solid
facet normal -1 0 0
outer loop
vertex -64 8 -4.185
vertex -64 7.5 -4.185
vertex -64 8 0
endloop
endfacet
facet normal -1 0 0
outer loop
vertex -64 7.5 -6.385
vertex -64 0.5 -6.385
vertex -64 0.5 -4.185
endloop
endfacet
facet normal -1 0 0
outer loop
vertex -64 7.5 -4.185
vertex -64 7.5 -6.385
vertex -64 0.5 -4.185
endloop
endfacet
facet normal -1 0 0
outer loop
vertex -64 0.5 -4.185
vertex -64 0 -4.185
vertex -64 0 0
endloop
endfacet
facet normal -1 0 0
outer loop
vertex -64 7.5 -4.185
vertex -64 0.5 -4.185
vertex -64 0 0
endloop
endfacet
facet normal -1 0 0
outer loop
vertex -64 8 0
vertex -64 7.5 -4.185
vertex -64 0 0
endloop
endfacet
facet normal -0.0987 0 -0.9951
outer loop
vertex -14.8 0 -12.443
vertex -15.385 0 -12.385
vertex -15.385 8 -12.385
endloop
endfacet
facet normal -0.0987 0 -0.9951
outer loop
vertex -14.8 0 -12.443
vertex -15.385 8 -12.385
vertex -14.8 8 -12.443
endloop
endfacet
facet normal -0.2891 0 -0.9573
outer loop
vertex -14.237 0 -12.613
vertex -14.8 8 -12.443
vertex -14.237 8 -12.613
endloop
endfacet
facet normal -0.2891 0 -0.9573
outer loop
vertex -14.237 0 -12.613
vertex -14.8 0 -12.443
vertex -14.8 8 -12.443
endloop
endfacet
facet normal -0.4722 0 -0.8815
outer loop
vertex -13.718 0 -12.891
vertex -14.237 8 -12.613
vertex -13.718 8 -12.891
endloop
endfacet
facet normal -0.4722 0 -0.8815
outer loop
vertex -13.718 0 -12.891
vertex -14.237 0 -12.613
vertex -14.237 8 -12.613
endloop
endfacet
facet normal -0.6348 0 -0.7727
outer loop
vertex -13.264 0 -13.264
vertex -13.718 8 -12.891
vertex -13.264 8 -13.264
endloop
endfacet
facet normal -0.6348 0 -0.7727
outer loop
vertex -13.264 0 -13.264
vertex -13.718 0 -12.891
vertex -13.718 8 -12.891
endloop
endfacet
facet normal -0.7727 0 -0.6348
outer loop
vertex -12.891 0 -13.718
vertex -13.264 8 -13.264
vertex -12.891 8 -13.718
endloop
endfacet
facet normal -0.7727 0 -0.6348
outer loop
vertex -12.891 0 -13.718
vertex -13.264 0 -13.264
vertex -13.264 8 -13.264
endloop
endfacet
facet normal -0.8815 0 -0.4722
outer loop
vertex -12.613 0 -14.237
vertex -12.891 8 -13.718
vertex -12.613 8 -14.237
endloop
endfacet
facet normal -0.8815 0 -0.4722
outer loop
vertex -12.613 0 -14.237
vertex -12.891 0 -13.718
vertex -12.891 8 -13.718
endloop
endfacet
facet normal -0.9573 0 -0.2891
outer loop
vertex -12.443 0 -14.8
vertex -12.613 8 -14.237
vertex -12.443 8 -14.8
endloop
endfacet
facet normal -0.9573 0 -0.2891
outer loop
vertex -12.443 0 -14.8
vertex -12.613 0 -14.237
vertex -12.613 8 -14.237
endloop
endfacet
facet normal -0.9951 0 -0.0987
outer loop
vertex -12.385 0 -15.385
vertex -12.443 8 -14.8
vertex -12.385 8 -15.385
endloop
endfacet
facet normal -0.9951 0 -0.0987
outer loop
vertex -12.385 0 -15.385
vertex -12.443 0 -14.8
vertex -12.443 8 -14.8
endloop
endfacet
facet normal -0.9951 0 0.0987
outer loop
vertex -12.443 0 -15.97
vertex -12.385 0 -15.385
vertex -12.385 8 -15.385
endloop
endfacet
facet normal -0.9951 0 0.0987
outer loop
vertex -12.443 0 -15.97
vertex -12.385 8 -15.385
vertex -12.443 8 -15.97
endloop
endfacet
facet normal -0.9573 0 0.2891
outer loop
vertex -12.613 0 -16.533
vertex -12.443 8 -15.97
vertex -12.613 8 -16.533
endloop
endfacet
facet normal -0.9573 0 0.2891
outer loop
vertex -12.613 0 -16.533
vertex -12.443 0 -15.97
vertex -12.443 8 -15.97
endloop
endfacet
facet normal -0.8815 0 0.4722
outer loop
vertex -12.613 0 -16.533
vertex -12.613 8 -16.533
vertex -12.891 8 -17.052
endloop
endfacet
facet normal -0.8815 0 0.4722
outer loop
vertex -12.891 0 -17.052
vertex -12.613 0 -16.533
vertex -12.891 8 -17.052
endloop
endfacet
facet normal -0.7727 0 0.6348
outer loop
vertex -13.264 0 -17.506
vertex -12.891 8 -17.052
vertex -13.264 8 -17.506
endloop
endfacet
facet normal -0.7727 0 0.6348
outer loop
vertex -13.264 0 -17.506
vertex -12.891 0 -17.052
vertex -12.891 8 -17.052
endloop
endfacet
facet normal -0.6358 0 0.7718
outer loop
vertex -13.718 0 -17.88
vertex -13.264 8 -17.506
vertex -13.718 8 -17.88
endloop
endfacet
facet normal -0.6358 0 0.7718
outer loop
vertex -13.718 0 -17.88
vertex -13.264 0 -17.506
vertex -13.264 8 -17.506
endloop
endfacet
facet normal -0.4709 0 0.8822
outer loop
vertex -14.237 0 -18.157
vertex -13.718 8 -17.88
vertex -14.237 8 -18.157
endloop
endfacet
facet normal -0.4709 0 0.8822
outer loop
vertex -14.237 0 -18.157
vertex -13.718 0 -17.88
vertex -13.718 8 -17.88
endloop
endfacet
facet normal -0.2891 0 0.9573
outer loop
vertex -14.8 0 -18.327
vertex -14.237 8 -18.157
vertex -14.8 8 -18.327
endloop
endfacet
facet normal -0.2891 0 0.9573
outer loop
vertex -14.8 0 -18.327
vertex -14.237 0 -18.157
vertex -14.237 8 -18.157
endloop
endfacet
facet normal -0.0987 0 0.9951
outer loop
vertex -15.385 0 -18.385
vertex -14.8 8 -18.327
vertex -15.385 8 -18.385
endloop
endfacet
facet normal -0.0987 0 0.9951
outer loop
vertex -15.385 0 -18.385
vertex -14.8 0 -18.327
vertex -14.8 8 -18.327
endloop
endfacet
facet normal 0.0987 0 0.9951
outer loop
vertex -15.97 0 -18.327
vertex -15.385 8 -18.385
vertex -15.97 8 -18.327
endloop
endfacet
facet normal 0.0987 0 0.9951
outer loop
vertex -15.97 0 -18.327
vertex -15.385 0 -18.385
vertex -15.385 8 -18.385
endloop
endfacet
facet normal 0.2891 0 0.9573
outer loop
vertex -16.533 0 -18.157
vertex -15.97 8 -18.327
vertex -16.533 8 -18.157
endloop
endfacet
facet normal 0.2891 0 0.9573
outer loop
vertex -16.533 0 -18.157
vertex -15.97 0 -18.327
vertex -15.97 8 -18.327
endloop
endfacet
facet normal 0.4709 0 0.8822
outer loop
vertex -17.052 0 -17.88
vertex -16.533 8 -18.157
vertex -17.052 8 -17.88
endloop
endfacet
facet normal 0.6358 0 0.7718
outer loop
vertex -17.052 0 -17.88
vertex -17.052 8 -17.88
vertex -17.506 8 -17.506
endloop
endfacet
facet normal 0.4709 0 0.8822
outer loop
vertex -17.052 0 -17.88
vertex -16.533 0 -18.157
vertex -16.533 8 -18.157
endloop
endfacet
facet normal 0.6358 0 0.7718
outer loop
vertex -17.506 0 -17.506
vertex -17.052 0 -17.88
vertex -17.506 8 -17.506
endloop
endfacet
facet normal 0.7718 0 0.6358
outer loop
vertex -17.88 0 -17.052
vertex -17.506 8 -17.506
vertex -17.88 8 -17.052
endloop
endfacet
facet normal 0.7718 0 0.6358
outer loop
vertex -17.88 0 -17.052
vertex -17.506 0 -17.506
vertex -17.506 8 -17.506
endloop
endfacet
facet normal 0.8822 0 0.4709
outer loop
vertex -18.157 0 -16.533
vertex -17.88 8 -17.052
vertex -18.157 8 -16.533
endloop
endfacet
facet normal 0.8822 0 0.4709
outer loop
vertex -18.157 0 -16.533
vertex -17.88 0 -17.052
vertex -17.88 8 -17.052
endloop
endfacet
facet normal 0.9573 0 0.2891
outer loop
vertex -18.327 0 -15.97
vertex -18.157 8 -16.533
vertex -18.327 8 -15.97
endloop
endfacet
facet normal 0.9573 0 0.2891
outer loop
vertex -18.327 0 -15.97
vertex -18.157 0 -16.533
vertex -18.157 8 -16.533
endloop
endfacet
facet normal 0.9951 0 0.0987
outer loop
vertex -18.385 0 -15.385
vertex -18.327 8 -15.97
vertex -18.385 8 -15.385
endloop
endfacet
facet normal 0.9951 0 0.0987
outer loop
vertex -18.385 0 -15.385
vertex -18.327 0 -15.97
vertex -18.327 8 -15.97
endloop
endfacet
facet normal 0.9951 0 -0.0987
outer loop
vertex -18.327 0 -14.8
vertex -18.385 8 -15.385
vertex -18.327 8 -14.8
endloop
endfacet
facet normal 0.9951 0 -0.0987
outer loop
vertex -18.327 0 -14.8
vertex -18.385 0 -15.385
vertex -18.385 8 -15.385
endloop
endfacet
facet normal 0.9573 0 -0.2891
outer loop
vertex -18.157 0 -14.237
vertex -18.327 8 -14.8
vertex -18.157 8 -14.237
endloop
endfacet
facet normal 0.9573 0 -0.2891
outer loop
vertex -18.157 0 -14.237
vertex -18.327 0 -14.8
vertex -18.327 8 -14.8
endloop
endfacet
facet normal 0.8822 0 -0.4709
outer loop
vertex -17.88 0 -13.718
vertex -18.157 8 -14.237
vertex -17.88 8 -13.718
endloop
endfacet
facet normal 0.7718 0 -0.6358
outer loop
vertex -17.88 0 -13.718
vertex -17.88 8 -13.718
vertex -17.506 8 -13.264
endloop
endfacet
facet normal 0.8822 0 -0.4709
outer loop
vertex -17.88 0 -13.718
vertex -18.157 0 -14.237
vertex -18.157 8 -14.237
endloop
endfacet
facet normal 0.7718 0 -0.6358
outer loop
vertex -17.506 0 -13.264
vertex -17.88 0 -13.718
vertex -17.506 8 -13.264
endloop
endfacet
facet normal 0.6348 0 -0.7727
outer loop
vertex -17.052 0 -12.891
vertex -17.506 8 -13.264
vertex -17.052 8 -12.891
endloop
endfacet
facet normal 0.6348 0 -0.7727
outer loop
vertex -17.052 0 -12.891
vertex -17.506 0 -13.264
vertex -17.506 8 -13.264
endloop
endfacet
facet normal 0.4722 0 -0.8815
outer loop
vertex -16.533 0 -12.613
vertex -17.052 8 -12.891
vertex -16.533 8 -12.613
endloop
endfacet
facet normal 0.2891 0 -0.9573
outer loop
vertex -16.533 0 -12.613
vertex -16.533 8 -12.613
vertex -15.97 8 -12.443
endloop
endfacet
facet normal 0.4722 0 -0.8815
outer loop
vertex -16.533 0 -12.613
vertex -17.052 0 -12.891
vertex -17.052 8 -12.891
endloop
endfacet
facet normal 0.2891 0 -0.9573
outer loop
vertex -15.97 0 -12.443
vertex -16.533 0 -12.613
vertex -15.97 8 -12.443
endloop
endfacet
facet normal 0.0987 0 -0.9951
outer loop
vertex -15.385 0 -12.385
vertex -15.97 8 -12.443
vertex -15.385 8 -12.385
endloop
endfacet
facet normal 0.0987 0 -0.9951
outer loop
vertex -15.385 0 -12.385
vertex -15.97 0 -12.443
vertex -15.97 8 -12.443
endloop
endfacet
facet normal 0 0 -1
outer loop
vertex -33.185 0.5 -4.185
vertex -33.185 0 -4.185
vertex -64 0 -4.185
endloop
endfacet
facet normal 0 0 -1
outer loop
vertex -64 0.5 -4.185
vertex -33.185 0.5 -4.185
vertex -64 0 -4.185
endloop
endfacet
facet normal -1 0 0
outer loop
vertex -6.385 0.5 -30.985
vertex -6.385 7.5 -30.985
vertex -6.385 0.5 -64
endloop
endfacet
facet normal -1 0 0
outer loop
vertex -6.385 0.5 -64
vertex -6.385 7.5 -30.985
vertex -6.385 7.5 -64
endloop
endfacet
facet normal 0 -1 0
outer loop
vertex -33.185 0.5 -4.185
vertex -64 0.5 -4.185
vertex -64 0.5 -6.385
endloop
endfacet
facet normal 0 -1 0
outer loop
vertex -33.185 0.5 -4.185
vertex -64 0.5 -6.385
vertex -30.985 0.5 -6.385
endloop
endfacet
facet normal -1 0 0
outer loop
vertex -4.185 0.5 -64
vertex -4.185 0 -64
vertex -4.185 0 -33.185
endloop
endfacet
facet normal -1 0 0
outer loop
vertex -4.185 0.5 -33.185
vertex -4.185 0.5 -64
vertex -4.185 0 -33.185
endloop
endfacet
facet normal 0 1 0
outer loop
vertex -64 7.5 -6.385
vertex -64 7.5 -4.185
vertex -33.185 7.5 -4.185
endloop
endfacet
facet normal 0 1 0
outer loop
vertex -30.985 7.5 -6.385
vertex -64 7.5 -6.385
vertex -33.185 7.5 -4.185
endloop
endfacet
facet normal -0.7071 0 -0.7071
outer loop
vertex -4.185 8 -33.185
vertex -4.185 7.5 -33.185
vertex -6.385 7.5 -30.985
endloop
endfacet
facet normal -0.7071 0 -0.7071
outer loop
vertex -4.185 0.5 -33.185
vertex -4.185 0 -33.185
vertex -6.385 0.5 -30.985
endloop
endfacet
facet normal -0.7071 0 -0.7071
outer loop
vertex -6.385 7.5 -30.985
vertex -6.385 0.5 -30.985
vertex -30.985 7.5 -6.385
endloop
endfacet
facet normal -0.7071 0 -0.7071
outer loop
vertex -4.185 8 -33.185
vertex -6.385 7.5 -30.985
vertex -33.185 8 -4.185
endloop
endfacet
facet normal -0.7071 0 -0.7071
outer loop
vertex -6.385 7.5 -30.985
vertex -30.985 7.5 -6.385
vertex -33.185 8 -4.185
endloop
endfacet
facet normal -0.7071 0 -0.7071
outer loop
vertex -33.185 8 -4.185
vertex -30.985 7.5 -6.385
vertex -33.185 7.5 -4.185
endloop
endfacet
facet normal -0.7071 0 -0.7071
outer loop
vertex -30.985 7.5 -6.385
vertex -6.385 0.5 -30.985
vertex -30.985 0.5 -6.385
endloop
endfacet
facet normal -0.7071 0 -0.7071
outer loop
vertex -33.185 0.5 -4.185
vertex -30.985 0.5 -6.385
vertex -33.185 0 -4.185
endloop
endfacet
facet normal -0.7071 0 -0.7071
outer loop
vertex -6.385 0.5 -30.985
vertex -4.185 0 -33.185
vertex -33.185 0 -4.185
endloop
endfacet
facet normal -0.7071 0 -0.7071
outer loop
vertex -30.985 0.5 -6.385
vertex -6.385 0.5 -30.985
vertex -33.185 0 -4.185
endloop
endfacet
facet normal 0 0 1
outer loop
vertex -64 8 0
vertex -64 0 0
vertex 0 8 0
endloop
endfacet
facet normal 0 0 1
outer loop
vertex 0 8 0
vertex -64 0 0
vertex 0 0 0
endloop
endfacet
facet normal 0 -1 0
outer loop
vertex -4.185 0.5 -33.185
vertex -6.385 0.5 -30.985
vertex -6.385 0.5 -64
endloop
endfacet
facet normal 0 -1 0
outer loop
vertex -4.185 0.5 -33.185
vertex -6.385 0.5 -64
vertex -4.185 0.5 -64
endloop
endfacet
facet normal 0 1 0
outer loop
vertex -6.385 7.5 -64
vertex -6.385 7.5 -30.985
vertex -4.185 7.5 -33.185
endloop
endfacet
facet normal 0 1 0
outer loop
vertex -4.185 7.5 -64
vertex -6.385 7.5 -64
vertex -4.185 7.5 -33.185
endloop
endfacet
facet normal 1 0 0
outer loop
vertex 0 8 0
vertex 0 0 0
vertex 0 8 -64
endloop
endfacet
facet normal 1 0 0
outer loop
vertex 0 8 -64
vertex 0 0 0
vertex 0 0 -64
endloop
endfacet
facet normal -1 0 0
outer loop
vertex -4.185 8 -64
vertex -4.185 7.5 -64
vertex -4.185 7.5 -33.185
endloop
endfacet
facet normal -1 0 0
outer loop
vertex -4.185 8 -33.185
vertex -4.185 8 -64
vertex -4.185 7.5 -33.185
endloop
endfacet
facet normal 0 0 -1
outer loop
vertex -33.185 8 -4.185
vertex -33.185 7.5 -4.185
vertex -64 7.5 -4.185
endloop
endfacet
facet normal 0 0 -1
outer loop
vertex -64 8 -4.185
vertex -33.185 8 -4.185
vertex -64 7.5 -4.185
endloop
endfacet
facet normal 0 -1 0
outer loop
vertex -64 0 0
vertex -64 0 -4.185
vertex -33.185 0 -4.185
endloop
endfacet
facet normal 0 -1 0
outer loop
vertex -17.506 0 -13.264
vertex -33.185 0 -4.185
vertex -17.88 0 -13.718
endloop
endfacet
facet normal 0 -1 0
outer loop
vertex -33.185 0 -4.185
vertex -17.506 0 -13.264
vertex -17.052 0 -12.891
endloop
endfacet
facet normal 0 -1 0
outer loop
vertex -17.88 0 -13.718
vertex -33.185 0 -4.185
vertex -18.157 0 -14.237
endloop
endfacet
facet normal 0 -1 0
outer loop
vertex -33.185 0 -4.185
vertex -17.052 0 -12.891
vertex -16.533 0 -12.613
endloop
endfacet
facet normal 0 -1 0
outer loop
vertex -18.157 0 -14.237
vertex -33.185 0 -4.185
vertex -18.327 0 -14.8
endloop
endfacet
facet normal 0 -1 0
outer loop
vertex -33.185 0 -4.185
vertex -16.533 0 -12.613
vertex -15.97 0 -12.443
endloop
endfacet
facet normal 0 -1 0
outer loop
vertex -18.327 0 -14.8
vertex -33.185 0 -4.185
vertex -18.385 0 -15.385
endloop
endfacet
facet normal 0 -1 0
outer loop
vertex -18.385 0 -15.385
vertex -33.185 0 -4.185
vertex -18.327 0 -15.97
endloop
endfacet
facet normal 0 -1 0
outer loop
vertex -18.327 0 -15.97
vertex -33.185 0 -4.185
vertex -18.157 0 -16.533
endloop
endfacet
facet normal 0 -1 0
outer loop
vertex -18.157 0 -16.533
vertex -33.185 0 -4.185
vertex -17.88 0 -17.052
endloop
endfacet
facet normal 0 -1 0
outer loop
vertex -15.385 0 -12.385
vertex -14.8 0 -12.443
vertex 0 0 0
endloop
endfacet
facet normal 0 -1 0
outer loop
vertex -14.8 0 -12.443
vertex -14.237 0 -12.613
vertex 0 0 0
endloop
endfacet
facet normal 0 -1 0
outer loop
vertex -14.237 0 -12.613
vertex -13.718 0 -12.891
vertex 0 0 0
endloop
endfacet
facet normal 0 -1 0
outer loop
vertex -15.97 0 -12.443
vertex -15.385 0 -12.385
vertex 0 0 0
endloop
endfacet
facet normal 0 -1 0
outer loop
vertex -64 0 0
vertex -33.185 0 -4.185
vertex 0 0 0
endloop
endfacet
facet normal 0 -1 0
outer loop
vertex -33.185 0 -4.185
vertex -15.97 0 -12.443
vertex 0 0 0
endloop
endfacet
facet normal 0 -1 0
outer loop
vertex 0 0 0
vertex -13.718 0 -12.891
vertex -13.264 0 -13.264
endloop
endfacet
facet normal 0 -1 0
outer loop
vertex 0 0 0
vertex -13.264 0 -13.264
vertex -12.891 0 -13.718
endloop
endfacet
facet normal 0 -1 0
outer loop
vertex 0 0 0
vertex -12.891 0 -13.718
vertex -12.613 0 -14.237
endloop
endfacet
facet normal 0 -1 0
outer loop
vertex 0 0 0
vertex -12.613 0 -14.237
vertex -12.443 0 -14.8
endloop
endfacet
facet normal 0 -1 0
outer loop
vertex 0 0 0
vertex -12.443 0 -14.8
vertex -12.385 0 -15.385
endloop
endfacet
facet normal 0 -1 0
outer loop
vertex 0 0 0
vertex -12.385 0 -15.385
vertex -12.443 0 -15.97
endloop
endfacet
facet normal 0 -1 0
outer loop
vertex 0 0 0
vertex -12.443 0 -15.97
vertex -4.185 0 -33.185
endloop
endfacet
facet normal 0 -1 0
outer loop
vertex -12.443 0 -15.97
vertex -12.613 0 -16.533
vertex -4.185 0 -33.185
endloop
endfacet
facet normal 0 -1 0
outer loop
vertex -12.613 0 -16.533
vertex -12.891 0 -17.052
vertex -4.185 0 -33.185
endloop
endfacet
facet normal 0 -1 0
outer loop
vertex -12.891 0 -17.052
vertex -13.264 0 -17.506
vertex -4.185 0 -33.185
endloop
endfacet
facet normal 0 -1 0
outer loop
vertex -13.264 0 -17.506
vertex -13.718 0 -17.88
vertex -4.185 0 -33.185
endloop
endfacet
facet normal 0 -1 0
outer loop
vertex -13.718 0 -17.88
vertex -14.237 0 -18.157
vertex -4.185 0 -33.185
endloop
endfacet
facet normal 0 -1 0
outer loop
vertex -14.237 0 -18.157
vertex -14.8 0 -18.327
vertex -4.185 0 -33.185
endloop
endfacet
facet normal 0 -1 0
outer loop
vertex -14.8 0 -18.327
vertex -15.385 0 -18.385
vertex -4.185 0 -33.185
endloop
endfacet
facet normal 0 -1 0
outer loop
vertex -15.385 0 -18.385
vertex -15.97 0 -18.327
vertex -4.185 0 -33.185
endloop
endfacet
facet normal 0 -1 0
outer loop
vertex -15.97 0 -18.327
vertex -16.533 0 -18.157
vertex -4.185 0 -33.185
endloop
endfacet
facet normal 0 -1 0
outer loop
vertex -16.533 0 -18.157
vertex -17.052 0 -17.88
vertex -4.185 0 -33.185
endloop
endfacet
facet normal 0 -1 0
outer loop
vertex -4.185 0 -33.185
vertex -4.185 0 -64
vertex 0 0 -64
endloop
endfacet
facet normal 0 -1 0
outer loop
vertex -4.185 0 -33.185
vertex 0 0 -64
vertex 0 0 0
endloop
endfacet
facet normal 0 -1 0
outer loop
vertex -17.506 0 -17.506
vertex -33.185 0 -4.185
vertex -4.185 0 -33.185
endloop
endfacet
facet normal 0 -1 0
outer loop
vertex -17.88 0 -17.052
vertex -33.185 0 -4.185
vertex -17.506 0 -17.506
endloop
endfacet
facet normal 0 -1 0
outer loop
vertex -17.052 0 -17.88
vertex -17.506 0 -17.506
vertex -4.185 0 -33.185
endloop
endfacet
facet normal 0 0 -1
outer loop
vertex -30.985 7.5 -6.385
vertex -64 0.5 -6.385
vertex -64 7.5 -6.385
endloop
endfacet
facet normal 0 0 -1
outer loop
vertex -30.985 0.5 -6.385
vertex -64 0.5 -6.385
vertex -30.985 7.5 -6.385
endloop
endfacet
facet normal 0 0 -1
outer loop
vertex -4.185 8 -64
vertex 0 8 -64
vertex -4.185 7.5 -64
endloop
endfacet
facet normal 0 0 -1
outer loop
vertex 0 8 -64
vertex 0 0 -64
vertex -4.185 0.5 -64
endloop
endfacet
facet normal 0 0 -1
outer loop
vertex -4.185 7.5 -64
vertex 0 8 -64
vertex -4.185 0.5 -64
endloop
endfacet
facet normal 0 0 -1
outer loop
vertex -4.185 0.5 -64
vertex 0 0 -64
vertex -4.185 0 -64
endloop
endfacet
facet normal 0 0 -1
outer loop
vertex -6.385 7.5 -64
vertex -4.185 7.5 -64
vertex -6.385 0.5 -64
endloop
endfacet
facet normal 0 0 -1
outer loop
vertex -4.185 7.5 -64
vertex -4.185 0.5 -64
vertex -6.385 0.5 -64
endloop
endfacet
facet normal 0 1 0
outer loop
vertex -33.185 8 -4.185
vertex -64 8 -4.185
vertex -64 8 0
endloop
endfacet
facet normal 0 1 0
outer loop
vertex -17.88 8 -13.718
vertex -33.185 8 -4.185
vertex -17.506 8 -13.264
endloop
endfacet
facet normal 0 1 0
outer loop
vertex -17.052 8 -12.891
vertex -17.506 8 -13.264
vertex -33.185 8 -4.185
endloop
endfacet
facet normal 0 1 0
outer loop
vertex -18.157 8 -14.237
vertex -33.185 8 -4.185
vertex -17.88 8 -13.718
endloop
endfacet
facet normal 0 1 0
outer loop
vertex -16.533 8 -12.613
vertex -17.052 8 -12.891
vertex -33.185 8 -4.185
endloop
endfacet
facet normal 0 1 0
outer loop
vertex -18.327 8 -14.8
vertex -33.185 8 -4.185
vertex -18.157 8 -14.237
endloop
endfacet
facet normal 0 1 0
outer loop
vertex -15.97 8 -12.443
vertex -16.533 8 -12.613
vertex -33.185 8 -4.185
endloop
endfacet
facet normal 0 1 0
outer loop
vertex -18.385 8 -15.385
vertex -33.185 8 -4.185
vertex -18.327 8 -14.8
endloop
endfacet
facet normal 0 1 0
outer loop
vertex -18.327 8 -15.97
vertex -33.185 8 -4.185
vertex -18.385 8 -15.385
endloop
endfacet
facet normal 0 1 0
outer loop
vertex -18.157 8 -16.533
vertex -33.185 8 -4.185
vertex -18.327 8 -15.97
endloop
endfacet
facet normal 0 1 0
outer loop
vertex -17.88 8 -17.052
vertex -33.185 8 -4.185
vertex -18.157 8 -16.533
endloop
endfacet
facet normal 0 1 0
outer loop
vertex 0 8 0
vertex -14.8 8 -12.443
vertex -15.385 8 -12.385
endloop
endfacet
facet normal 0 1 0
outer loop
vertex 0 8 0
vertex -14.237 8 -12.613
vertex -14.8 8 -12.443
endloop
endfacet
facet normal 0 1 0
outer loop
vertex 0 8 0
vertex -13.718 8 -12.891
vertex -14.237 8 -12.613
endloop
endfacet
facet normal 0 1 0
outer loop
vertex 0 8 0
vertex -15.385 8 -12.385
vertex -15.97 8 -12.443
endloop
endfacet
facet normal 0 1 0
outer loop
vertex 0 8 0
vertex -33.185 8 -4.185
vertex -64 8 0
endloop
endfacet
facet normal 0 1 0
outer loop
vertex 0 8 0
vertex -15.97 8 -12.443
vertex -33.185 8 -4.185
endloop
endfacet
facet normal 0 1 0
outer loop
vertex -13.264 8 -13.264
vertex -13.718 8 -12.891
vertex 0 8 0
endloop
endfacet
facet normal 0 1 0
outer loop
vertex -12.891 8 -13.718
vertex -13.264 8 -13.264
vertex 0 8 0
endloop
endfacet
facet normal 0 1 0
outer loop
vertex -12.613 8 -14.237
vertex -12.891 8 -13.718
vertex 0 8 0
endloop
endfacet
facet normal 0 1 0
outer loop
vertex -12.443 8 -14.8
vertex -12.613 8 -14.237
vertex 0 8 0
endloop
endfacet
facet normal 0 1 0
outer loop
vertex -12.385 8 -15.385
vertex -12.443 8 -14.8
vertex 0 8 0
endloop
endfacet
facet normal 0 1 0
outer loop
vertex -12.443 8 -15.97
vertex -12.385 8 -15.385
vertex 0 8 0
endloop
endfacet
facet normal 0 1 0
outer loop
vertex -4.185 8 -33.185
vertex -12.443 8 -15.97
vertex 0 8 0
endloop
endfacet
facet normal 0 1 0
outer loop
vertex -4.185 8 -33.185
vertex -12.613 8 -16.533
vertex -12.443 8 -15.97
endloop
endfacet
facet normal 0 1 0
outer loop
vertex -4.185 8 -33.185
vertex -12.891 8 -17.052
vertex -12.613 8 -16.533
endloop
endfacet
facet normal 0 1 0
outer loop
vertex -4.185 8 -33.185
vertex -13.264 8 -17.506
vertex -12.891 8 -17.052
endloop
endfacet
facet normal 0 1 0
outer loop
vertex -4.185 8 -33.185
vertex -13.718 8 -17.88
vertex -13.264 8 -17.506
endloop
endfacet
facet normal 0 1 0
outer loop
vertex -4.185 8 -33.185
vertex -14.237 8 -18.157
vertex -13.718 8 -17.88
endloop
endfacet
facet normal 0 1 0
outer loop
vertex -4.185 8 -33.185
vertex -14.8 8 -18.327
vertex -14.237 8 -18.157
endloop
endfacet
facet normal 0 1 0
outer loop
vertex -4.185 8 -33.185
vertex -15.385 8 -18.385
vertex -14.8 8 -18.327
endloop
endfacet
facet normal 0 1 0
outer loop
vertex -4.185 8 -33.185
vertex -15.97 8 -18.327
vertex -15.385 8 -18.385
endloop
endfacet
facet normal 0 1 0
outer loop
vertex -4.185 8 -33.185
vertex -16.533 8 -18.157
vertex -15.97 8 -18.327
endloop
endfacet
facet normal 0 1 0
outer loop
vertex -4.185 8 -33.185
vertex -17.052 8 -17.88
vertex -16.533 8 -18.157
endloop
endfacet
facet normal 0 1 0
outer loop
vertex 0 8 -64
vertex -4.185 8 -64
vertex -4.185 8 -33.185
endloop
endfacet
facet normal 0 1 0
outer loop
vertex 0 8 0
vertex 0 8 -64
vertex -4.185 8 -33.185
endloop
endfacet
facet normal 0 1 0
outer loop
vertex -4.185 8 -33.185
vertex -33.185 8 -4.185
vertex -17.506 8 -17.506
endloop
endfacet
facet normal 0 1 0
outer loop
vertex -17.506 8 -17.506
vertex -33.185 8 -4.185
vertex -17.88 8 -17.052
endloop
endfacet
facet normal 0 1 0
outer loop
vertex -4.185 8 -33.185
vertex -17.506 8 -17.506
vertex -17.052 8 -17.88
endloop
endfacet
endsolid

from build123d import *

# Parameters (mm, degrees)
SKETCH_1_R      = 3
EXTRUDE_1_DEPTH = 8
EXTRUDE_START   = -4
EXTRUDE_3_DEPTH = 3.5


with BuildPart() as part:
    # 草图1 → 凸台-拉伸1 (new body)
    with BuildSketch(Plane(origin=(0, 0, 0), x_dir=(1, 0, 0), z_dir=(0, 1, 0))):
        Polygon((0, 0), (0, 64), (-4.185096591, 64), (-4.185096591, 33.185096591), (-33.185096591, 4.185096591), (-64, 4.185096591), (-64, 0), align=None)
        with Locations(Location((-15.385096591, 15.385096591, 0), (0, 0, 270))):
            Circle(SKETCH_1_R, mode=Mode.SUBTRACT)
    extrude(amount=EXTRUDE_1_DEPTH)

    # 草图4 → 凸台-拉伸3 (add, symmetric)
    with BuildSketch(Plane.XZ.offset(EXTRUDE_START)):
        Polygon((-6.385096591, -30.985096591), (-6.385096591, -64), (-4.185096591, -64), (-4.185096591, -33.185096591), align=None)
        Polygon((-64, -4.185096591), (-64, -6.385096591), (-30.985096591, -6.385096591), (-33.185096591, -4.185096591), align=None)
    extrude(amount=EXTRUDE_3_DEPTH, both=True)


solid = part.part
